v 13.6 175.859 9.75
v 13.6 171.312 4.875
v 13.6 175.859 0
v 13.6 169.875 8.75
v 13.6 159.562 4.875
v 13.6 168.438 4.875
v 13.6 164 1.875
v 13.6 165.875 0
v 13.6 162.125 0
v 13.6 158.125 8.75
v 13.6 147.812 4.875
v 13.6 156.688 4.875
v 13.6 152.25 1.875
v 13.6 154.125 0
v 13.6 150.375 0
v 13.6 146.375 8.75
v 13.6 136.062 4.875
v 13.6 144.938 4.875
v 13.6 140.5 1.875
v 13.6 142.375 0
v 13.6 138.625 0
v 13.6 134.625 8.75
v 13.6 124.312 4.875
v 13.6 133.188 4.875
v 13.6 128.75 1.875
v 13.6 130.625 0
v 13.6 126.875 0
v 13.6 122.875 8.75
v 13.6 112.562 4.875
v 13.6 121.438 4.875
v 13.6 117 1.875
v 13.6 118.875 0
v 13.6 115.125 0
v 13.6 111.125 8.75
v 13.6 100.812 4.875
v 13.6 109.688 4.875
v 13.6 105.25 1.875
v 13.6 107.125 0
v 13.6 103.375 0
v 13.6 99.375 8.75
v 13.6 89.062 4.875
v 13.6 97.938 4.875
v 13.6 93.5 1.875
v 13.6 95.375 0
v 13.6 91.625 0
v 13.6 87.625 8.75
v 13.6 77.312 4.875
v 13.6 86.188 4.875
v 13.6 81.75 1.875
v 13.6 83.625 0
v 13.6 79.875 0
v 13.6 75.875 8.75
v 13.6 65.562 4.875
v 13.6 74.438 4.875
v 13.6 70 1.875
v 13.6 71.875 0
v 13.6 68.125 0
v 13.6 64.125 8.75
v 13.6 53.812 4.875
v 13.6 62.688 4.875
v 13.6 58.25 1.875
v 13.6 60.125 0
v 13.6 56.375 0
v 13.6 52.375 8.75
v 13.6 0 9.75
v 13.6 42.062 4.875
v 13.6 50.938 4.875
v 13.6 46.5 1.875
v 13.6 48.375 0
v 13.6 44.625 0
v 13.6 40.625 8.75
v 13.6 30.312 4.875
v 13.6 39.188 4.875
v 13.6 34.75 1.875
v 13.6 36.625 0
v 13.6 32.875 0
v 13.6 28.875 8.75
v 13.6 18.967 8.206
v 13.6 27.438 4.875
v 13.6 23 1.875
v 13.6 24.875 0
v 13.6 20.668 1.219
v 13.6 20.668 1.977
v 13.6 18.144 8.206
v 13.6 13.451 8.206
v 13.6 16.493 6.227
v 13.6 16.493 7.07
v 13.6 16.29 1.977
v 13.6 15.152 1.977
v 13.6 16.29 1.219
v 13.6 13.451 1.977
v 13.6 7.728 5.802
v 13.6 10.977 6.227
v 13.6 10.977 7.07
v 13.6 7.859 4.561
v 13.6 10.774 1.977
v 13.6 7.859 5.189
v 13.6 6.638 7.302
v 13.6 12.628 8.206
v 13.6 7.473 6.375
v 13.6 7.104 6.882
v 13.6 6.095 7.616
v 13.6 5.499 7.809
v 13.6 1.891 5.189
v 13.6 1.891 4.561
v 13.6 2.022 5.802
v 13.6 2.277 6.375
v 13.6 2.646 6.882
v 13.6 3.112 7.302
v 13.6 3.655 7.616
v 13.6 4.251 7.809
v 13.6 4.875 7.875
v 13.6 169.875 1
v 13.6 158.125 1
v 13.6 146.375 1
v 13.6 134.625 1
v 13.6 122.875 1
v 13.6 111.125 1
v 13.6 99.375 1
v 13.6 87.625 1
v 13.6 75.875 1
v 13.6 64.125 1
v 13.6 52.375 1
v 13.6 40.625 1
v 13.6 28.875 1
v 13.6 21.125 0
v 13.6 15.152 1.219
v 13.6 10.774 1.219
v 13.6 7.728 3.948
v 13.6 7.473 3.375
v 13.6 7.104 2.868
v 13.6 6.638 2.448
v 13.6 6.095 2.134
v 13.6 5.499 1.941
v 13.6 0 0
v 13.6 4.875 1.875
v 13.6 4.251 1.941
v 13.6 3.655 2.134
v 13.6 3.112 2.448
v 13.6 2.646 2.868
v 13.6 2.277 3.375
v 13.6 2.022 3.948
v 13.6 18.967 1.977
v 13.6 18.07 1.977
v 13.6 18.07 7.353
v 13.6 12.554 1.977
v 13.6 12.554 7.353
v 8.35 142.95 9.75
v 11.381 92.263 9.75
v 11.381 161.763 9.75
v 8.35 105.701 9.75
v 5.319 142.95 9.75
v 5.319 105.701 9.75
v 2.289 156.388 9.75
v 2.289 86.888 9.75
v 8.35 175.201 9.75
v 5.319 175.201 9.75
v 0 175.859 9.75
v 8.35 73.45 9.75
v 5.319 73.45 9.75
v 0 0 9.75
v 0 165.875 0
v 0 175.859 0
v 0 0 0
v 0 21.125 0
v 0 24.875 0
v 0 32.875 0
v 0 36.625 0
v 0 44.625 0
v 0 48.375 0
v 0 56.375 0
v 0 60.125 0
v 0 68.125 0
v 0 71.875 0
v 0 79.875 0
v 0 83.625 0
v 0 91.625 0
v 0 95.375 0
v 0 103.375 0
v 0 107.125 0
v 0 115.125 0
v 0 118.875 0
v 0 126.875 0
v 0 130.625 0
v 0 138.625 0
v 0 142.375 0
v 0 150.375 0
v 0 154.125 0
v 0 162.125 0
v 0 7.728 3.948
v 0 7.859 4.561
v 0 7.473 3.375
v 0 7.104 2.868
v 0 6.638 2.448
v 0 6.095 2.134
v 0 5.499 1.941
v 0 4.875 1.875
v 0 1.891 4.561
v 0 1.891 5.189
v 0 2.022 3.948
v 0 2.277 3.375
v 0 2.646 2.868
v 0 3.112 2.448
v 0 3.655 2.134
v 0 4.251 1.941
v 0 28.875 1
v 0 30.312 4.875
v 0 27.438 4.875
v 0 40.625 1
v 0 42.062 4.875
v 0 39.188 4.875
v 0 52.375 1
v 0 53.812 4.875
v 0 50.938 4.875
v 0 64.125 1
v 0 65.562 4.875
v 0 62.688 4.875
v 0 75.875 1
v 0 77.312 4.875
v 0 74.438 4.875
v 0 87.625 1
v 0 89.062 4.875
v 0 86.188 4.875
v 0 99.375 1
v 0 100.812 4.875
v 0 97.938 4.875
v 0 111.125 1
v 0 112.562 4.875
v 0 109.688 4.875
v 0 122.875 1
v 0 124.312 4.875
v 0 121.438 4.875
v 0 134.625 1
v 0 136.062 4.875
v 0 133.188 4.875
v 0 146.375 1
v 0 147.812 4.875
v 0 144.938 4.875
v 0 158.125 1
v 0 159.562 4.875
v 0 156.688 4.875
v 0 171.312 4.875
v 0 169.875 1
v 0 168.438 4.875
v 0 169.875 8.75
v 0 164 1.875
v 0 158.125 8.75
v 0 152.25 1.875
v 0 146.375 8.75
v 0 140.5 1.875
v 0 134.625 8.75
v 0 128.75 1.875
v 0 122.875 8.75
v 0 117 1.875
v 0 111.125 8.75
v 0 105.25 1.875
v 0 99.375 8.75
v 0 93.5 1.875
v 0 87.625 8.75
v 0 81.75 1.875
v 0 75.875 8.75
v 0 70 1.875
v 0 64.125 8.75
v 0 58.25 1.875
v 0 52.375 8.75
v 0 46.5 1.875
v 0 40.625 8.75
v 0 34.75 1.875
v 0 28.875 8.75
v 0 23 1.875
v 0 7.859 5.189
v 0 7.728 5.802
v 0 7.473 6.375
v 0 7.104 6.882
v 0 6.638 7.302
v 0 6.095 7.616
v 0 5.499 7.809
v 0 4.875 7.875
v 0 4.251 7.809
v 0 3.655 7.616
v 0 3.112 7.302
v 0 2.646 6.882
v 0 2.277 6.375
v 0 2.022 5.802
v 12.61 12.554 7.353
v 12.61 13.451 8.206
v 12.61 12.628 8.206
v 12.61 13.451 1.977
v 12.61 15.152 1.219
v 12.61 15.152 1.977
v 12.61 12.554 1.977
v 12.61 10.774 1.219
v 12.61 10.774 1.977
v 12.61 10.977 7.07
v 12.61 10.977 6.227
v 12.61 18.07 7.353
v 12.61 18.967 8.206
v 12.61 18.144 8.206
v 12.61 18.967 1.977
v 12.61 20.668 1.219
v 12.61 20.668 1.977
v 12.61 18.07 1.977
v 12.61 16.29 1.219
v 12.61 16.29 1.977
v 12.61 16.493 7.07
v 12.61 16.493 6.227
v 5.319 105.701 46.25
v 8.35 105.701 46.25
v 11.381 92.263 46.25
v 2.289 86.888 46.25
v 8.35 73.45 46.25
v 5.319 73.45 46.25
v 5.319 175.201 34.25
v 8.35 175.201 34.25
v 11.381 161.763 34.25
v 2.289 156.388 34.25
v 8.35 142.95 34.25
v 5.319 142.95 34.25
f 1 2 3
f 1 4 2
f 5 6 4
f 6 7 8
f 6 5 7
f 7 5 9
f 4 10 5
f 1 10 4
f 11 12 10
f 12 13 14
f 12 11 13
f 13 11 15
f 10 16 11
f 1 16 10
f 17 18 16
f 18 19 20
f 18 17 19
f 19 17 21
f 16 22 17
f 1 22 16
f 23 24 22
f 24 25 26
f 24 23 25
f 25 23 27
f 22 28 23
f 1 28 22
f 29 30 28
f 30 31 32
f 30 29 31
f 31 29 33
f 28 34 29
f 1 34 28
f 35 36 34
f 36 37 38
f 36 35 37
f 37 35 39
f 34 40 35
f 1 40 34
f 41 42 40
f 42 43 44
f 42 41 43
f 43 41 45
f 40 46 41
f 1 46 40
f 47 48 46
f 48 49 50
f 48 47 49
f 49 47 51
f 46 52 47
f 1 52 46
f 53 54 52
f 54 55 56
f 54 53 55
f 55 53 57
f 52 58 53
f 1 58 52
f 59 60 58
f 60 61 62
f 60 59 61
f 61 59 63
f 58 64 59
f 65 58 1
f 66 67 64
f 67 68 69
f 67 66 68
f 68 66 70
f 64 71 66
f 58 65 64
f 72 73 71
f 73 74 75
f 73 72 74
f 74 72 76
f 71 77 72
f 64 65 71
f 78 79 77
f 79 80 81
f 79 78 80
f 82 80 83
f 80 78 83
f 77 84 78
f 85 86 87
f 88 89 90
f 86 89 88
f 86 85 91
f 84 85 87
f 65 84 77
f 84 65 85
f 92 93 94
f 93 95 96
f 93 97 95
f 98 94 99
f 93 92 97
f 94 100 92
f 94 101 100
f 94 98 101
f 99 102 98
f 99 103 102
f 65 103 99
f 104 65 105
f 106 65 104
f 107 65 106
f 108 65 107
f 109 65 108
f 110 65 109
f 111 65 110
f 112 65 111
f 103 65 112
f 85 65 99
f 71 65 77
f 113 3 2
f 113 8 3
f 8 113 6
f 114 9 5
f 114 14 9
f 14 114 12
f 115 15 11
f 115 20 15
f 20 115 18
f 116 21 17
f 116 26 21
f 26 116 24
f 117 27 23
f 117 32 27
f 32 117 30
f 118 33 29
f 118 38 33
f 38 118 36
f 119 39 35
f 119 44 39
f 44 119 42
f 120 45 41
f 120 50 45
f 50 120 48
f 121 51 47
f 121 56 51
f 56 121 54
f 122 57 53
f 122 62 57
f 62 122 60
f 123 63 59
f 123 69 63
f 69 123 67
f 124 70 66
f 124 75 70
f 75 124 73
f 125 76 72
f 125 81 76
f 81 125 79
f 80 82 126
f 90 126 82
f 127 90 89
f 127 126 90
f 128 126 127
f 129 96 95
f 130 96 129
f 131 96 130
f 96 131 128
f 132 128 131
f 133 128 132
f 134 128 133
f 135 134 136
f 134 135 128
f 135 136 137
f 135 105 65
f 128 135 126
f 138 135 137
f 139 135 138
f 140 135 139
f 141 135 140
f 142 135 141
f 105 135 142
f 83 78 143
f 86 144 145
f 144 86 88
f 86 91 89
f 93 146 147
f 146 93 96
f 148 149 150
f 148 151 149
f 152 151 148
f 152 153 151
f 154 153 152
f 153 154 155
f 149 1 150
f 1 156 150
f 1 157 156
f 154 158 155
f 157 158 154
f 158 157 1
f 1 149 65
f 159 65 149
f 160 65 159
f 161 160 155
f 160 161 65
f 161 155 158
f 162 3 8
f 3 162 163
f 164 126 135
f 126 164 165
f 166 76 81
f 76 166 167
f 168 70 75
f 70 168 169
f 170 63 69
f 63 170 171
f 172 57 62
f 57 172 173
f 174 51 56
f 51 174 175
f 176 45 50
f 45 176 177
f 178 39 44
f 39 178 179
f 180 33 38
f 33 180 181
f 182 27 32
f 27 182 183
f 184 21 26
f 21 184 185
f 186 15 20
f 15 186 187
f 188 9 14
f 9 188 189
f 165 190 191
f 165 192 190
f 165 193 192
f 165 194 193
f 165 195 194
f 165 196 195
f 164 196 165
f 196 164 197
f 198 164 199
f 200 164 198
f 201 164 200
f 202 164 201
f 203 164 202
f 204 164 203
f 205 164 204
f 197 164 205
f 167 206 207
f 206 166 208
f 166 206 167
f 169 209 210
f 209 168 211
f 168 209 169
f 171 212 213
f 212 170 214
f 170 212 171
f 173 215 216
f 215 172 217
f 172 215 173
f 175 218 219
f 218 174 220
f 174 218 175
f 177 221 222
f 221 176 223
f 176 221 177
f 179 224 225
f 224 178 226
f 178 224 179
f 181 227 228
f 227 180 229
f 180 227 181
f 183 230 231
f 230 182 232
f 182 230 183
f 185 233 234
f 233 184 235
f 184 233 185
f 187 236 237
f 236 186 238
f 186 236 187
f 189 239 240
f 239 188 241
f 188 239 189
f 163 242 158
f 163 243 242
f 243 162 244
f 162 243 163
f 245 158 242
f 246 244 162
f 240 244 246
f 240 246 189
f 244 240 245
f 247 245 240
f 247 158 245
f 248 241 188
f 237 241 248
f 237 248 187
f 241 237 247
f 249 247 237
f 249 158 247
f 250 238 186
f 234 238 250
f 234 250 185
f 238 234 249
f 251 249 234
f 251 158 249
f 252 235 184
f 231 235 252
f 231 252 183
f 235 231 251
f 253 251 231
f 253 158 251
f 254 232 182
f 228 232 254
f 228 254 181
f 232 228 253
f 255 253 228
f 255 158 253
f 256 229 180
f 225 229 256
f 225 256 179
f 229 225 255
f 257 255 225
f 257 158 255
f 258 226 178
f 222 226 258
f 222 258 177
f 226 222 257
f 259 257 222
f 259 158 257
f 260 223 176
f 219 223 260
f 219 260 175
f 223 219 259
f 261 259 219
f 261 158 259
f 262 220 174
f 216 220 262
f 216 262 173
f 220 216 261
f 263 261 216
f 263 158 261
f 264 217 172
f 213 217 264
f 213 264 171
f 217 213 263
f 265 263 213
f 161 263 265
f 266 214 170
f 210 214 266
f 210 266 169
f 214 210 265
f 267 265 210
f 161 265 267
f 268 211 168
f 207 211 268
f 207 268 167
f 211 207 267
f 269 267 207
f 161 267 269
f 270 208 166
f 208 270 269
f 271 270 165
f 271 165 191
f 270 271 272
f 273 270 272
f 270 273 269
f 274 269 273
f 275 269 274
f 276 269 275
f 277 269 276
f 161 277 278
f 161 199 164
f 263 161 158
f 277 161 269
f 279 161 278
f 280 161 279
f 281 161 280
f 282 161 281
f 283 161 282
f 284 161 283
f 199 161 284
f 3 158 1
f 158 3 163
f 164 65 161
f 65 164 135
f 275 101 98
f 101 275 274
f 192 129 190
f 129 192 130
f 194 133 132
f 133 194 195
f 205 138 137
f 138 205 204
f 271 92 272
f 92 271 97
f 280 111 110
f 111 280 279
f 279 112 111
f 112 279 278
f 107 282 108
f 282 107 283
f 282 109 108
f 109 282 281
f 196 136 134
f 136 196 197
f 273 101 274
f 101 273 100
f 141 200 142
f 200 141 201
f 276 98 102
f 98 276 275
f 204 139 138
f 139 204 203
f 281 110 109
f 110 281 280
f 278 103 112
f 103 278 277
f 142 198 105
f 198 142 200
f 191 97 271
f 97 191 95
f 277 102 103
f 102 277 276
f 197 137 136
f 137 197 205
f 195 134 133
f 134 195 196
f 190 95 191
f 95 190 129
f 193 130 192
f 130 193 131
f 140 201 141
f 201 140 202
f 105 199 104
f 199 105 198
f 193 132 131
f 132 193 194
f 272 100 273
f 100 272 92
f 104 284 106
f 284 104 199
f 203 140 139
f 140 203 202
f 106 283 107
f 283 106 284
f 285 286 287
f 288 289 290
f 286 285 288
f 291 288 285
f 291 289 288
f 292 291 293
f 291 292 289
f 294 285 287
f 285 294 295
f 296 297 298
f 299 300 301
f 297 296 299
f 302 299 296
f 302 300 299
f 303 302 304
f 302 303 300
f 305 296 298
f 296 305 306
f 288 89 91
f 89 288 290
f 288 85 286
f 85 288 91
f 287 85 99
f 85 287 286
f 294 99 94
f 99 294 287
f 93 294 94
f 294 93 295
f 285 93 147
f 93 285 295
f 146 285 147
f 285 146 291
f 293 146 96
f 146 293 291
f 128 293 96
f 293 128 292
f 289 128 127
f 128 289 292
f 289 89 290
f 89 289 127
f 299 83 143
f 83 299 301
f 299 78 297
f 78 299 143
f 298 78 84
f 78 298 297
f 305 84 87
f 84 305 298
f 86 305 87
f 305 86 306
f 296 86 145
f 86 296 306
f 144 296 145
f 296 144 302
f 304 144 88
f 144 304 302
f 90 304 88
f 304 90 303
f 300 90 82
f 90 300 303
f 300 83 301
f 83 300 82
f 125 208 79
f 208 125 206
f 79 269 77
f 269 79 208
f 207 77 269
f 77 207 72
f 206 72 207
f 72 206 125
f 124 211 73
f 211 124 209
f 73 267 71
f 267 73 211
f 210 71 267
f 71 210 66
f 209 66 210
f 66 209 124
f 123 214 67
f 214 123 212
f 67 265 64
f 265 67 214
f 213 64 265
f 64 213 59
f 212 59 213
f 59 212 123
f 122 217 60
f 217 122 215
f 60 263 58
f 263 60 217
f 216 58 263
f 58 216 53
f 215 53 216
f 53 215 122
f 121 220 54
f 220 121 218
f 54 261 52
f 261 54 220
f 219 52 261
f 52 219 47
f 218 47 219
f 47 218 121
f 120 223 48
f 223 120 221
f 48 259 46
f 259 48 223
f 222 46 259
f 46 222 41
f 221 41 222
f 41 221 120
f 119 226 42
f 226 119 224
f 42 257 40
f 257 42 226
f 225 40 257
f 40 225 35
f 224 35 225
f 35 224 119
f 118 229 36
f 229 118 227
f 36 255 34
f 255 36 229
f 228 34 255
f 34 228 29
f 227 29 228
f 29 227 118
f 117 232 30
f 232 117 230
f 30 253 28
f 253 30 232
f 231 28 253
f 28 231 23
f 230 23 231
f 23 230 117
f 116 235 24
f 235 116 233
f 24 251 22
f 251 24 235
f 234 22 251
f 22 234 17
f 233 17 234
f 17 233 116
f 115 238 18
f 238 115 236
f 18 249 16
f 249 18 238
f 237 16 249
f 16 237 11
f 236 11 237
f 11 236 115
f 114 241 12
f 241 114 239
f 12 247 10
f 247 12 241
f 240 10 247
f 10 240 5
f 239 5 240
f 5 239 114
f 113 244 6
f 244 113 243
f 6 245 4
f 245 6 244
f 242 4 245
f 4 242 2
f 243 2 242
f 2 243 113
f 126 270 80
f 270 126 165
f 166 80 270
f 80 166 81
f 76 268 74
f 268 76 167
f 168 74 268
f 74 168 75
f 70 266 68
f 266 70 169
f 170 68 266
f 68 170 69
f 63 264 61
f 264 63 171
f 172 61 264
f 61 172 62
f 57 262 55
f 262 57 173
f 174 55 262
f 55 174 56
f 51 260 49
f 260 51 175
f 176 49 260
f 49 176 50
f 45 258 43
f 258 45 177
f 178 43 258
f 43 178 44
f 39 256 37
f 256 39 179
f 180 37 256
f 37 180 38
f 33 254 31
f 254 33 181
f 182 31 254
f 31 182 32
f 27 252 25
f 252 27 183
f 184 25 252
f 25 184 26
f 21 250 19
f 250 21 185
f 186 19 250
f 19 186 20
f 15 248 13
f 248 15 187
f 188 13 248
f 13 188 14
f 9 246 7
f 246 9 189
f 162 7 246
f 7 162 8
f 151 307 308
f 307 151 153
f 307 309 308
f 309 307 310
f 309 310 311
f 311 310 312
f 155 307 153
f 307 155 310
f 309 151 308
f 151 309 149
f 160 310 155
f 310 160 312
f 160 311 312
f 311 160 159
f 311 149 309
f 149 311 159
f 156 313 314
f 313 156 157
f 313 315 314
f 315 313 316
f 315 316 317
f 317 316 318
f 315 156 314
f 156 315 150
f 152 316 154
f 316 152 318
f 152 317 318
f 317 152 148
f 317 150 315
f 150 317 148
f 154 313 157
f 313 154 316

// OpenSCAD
// file: values.scad
$fs=0.1;
//Constants:
edgeRadius=1.5;
underKeyWidth=13.6;
baseHeight=9.75;
genh=5.791666666666667;
a=27.423996629776394;
b=12.370392724366756;
c=12.370392724366756;
d=38.393595281686956;
overhead=65.81759191146335;
keyTravelDistance=13.0;
desiredGamut=24;
shift=3.092598181091689;
holeScale=0.5;
stalkScale=0.48;

Points = [
[shift,a,0],//0
[(b-shift),0,0],//1
[(b+shift),0,0],//2
[(b+c-shift),d,0],//3
[(c+shift),(a+d),0],//4
[(c-shift),(a+d),0],//5
[shift,a,keyTravelDistance],//6
[(b-shift),0,keyTravelDistance],//7
[(b+shift),0,keyTravelDistance],//8
[(b+c-shift),d,keyTravelDistance],//9
[(c+shift),(a+d),keyTravelDistance],//10
[(c-shift),(a+d),keyTravelDistance],//11
];
Faces = [
[0,1,2,3,4,5],
[1,0,6,7],
[2,1,7,8],
[3,2,8,9],
[4,3,9,10],
[5,4,10,11],
[0,5,11,6],
[11,10,9,8,7,6] 
];
// file: keytop.scad
include<values.scad>;
keytop();

module keytopShape(){
polyhedron(Points,Faces);
}
module keytop(){
difference(){
keytopShape();
translate([(b+c)/4,(d+a)/4,-0.1])
scale(holeScale,holeScale,holeScale)
keytopShape();
edge(6,11,1,-1);
edge(6,7,1,1);
edge(7,8,1,1);
edge(8,9,1,1);
edge(9,10,1,-1,-1);
edge(10,11,1,-1);
}
module edge (point1,point2,d1,d2,d3=1){
difference(){
translate([Points[point1][0],Points[point1][1],Points[point1][2]])
rotate([0,90,atan((Points[point2][1]-Points[point1][1])/(Points[point2][0]-Points[point1][0]))])
translate([0,0,d3*30])
rotate(45,0,0)
cube([pow(2*(edgeRadius*edgeRadius),1/2),pow(2*(edgeRadius*edgeRadius),1/2),90],true);
translate([Points[point1][0],Points[point1][1],Points[point1][2]])
rotate([0,90,atan((Points[point2][1]-Points[point1][1])/(Points[point2][0]-Points[point1][0]))])
translate([d1*edgeRadius,d2*edgeRadius,d3*30])
cylinder(90,edgeRadius,edgeRadius, true);
}
}

}
// main file
use<keytop.scad>
include<values.scad>
rotate([0,90,0])11_7();
module 11_7(keytops=false){
length=175.85925857813004;
rotate([0,-90,0]){
//Main Base:
difference(){
cube([underKeyWidth,length,baseHeight],false);
translate([-.1,0.5*baseHeight,0.5*baseHeight])rotate([0,90,0])
cylinder((underKeyWidth+.2),r=3, false);
translate([underKeyWidth-.99,10,0.125*baseHeight])
rotate([90,0,90])
linear_extrude(height=1){
text("11",size=baseHeight*0.75);
}

//Warp Cuts:
translate([-1,0.0+25+0.25*baseHeight,baseHeight-1])
rotate([0,90,0])
linear_extrude(height=underKeyWidth+2)
polygon(points=[[0.5*baseHeight-1,0],[baseHeight-2,0.25*baseHeight-1],[0.5*baseHeight-1,0.5*baseHeight-2],[0,0.25*baseHeight-1]]);
translate([-1,11.75+25+0.25*baseHeight,baseHeight-1])
rotate([0,90,0])
linear_extrude(height=underKeyWidth+2)
polygon(points=[[0.5*baseHeight-1,0],[baseHeight-2,0.25*baseHeight-1],[0.5*baseHeight-1,0.5*baseHeight-2],[0,0.25*baseHeight-1]]);
translate([-1,23.5+25+0.25*baseHeight,baseHeight-1])
rotate([0,90,0])
linear_extrude(height=underKeyWidth+2)
polygon(points=[[0.5*baseHeight-1,0],[baseHeight-2,0.25*baseHeight-1],[0.5*baseHeight-1,0.5*baseHeight-2],[0,0.25*baseHeight-1]]);
translate([-1,35.25+25+0.25*baseHeight,baseHeight-1])
rotate([0,90,0])
linear_extrude(height=underKeyWidth+2)
polygon(points=[[0.5*baseHeight-1,0],[baseHeight-2,0.25*baseHeight-1],[0.5*baseHeight-1,0.5*baseHeight-2],[0,0.25*baseHeight-1]]);
translate([-1,47.0+25+0.25*baseHeight,baseHeight-1])
rotate([0,90,0])
linear_extrude(height=underKeyWidth+2)
polygon(points=[[0.5*baseHeight-1,0],[baseHeight-2,0.25*baseHeight-1],[0.5*baseHeight-1,0.5*baseHeight-2],[0,0.25*baseHeight-1]]);
translate([-1,58.75+25+0.25*baseHeight,baseHeight-1])
rotate([0,90,0])
linear_extrude(height=underKeyWidth+2)
polygon(points=[[0.5*baseHeight-1,0],[baseHeight-2,0.25*baseHeight-1],[0.5*baseHeight-1,0.5*baseHeight-2],[0,0.25*baseHeight-1]]);
translate([-1,70.5+25+0.25*baseHeight,baseHeight-1])
rotate([0,90,0])
linear_extrude(height=underKeyWidth+2)
polygon(points=[[0.5*baseHeight-1,0],[baseHeight-2,0.25*baseHeight-1],[0.5*baseHeight-1,0.5*baseHeight-2],[0,0.25*baseHeight-1]]);
translate([-1,82.25+25+0.25*baseHeight,baseHeight-1])
rotate([0,90,0])
linear_extrude(height=underKeyWidth+2)
polygon(points=[[0.5*baseHeight-1,0],[baseHeight-2,0.25*baseHeight-1],[0.5*baseHeight-1,0.5*baseHeight-2],[0,0.25*baseHeight-1]]);
translate([-1,94.0+25+0.25*baseHeight,baseHeight-1])
rotate([0,90,0])
linear_extrude(height=underKeyWidth+2)
polygon(points=[[0.5*baseHeight-1,0],[baseHeight-2,0.25*baseHeight-1],[0.5*baseHeight-1,0.5*baseHeight-2],[0,0.25*baseHeight-1]]);
translate([-1,105.75+25+0.25*baseHeight,baseHeight-1])
rotate([0,90,0])
linear_extrude(height=underKeyWidth+2)
polygon(points=[[0.5*baseHeight-1,0],[baseHeight-2,0.25*baseHeight-1],[0.5*baseHeight-1,0.5*baseHeight-2],[0,0.25*baseHeight-1]]);
translate([-1,117.5+25+0.25*baseHeight,baseHeight-1])
rotate([0,90,0])
linear_extrude(height=underKeyWidth+2)
polygon(points=[[0.5*baseHeight-1,0],[baseHeight-2,0.25*baseHeight-1],[0.5*baseHeight-1,0.5*baseHeight-2],[0,0.25*baseHeight-1]]);
translate([-1,129.25+25+0.25*baseHeight,baseHeight-1])
rotate([0,90,0])
linear_extrude(height=underKeyWidth+2)
polygon(points=[[0.5*baseHeight-1,0],[baseHeight-2,0.25*baseHeight-1],[0.5*baseHeight-1,0.5*baseHeight-2],[0,0.25*baseHeight-1]]);
translate([-1,141.0+25+0.25*baseHeight,baseHeight-1])
rotate([0,90,0])
linear_extrude(height=underKeyWidth+2)
polygon(points=[[0.5*baseHeight-1,0],[baseHeight-2,0.25*baseHeight-1],[0.5*baseHeight-1,0.5*baseHeight-2],[0,0.25*baseHeight-1]]);
translate([-1,0.0+25-0.5*baseHeight-1,0.5*baseHeight-3])
rotate([0,90,0])
linear_extrude(height=underKeyWidth+2)
polygon(points=[[0.5*baseHeight-1,0],[baseHeight-2,0.5*baseHeight-1],[0.5*baseHeight-1,baseHeight-2],[0,0.5*baseHeight-1]]);
translate([-1,11.75+25-0.5*baseHeight-1,0.5*baseHeight-3])
rotate([0,90,0])
linear_extrude(height=underKeyWidth+2)
polygon(points=[[0.5*baseHeight-1,0],[baseHeight-2,0.5*baseHeight-1],[0.5*baseHeight-1,baseHeight-2],[0,0.5*baseHeight-1]]);
translate([-1,23.5+25-0.5*baseHeight-1,0.5*baseHeight-3])
rotate([0,90,0])
linear_extrude(height=underKeyWidth+2)
polygon(points=[[0.5*baseHeight-1,0],[baseHeight-2,0.5*baseHeight-1],[0.5*baseHeight-1,baseHeight-2],[0,0.5*baseHeight-1]]);
translate([-1,35.25+25-0.5*baseHeight-1,0.5*baseHeight-3])
rotate([0,90,0])
linear_extrude(height=underKeyWidth+2)
polygon(points=[[0.5*baseHeight-1,0],[baseHeight-2,0.5*baseHeight-1],[0.5*baseHeight-1,baseHeight-2],[0,0.5*baseHeight-1]]);
translate([-1,47.0+25-0.5*baseHeight-1,0.5*baseHeight-3])
rotate([0,90,0])
linear_extrude(height=underKeyWidth+2)
polygon(points=[[0.5*baseHeight-1,0],[baseHeight-2,0.5*baseHeight-1],[0.5*baseHeight-1,baseHeight-2],[0,0.5*baseHeight-1]]);
translate([-1,58.75+25-0.5*baseHeight-1,0.5*baseHeight-3])
rotate([0,90,0])
linear_extrude(height=underKeyWidth+2)
polygon(points=[[0.5*baseHeight-1,0],[baseHeight-2,0.5*baseHeight-1],[0.5*baseHeight-1,baseHeight-2],[0,0.5*baseHeight-1]]);
translate([-1,70.5+25-0.5*baseHeight-1,0.5*baseHeight-3])
rotate([0,90,0])
linear_extrude(height=underKeyWidth+2)
polygon(points=[[0.5*baseHeight-1,0],[baseHeight-2,0.5*baseHeight-1],[0.5*baseHeight-1,baseHeight-2],[0,0.5*baseHeight-1]]);
translate([-1,82.25+25-0.5*baseHeight-1,0.5*baseHeight-3])
rotate([0,90,0])
linear_extrude(height=underKeyWidth+2)
polygon(points=[[0.5*baseHeight-1,0],[baseHeight-2,0.5*baseHeight-1],[0.5*baseHeight-1,baseHeight-2],[0,0.5*baseHeight-1]]);
translate([-1,94.0+25-0.5*baseHeight-1,0.5*baseHeight-3])
rotate([0,90,0])
linear_extrude(height=underKeyWidth+2)
polygon(points=[[0.5*baseHeight-1,0],[baseHeight-2,0.5*baseHeight-1],[0.5*baseHeight-1,baseHeight-2],[0,0.5*baseHeight-1]]);
translate([-1,105.75+25-0.5*baseHeight-1,0.5*baseHeight-3])
rotate([0,90,0])
linear_extrude(height=underKeyWidth+2)
polygon(points=[[0.5*baseHeight-1,0],[baseHeight-2,0.5*baseHeight-1],[0.5*baseHeight-1,baseHeight-2],[0,0.5*baseHeight-1]]);
translate([-1,117.5+25-0.5*baseHeight-1,0.5*baseHeight-3])
rotate([0,90,0])
linear_extrude(height=underKeyWidth+2)
polygon(points=[[0.5*baseHeight-1,0],[baseHeight-2,0.5*baseHeight-1],[0.5*baseHeight-1,baseHeight-2],[0,0.5*baseHeight-1]]);
translate([-1,129.25+25-0.5*baseHeight-1,0.5*baseHeight-3])
rotate([0,90,0])
linear_extrude(height=underKeyWidth+2)
polygon(points=[[0.5*baseHeight-1,0],[baseHeight-2,0.5*baseHeight-1],[0.5*baseHeight-1,baseHeight-2],[0,0.5*baseHeight-1]]);
translate([-1,141.0+25-0.5*baseHeight-1,0.5*baseHeight-3])
rotate([0,90,0])
linear_extrude(height=underKeyWidth+2)
polygon(points=[[0.5*baseHeight-1,0],[baseHeight-2,0.5*baseHeight-1],[0.5*baseHeight-1,baseHeight-2],[0,0.5*baseHeight-1]]);
}
//Key Stalks:
translate([shift/4,(genh*7-(d+a)/2+overhead),baseHeight]){
linear_extrude(height=(keyTravelDistance*1.5+desiredGamut-7)){
scale((stalkScale+holeScale)/2,stalkScale)
polygon(points=[
[Points[0][0],Points[0][1]],[Points[1][0],Points[1][1]],[Points[2][0],Points[2][1]],[Points[3][0],Points[3][1]],[Points[4][0],Points[4][1]],[Points[5][0],Points[5][1]],[Points[6][0],Points[6][1]]
]);
}
if(keytops)
translate([0,(-0.5*(a+d)),(keyTravelDistance*1.5+desiredGamut-7+40)])
keytop();
}
translate([shift/4,(genh*19-(d+a)/2+overhead),baseHeight]){
linear_extrude(height=(keyTravelDistance*1.5+desiredGamut-19)){
scale((stalkScale+holeScale)/2,stalkScale)
polygon(points=[
[Points[0][0],Points[0][1]],[Points[1][0],Points[1][1]],[Points[2][0],Points[2][1]],[Points[3][0],Points[3][1]],[Points[4][0],Points[4][1]],[Points[5][0],Points[5][1]],[Points[6][0],Points[6][1]]
]);
}
if(keytops)
translate([0,(-0.5*(a+d)),(keyTravelDistance*1.5+desiredGamut-19+40)])
keytop();
}
}}
